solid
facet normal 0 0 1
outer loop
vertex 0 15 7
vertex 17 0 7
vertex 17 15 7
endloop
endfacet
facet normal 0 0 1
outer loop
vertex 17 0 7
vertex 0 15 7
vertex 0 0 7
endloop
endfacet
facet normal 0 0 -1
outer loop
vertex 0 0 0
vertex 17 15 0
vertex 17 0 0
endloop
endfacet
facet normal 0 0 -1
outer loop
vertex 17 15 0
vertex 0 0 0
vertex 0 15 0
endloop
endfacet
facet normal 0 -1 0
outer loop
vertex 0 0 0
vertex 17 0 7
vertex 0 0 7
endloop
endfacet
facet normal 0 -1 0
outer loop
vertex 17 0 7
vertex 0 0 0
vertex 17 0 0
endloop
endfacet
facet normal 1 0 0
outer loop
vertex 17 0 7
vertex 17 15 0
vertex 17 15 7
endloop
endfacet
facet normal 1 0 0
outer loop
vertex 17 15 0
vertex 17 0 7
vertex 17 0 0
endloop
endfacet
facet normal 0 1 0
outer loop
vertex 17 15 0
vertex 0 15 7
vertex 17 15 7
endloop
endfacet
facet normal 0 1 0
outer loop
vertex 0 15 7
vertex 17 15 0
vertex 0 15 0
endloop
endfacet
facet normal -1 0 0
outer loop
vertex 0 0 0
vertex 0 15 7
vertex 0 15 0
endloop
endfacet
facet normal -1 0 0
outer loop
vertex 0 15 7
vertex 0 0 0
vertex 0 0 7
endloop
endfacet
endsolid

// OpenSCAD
// Generated by SolidPython 1.0.1 on 2020-07-29 00:46:56


cube(size = [17, 15, 7]);
/***********************************************
*********      SolidPython code:      **********
************************************************
 
# import packages: SolidPython
from solid import *
from solid.utils import *
from itertools import chain, combinations, permutations


class Resize:

    def __init__(self, scad_file):
        self.scad_file = scad_file
        #self.scad_file = import_scad(scad_file)
        # cone/cylinder param:
        self.r1 = 0
        self.r2 = 0
        self.h = 0
        # rectangular prism param:
        self.w = 0
        self.l = 0
        # ellipse param:
        self.r = 0

    # import OpenScad code (file name corresponds to shape)


    # classify shape + parameters
    def assign(self, param1, param2, param3):
        if self.scad_file == 'cone.scad':
            self.r1 = param1
            self.r2 = param2
            self.h = param3
        elif self.scad_file == 'cylinder.scad':
            self.r1 = param1
            self.r2 = param2
            self.h = param3
        elif self.scad_file == 'rectangularPrism.scad':
            self.h = param1
            self.l = param2
            self.w = param3
        else:
            self.r = param1
            self.h = param2

    # resize parameters
    def iterate(self):
        x = range(3, 20, 2)
        i = 1
        if self.scad_file == 'cone.scad':
            tempList = list(permutations(x, 2))
            for temp in tempList:
                param1 = temp[0]
                param2 = temp[1]
                filepath = 'produced_scad_files/' + 'cone' + str(param1) + '_' + str(param2) + '_' + '.scad'
                scad_render_to_file(cylinder(h=param1, r1=param2, r2=0), filepath)

        elif self.scad_file == 'cylinder.scad':
            tempList = list(permutations(x, 3))
            for temp in tempList:
                param1 = temp[0]
                param2 = temp[1]
                filepath = 'produced_scad_files/' + 'cylinder' + str(param1) + '_' + str(param2) + '_' + '.scad'
                scad_render_to_file(cylinder(h=param1, r1=param2, r2=param2), filepath)

        elif self.scad_file == 'rectangularPrism.scad':
            tempList = list(permutations(x, 3))
            for temp in tempList:
                param1 = temp[0]
                param2 = temp[1]
                param3 = temp[2]
                filepath = 'produced_scad_files/' + 'rectangularPrism' + str(param1) + '_' + str(param2) + '_' + str(
                    param3) + '.scad'
                scad_render_to_file(cube(size=(param1, param2, param3)), filepath)

        elif self.scad_file == 'ellipse.scad':
            tempList = list(permutations(x, 4))
            for temp in tempList:
                param1 = temp[0]
                param2 = temp[1]
                param3 = temp[2]
                param4 = temp[3]
                filepath = 'produced_scad_files/' + 'ellipse' + str(param1) + '_' + str(param2) + '_' + str(param3) + '_' + str(param4) + '.scad'
                scad_render_to_file(scale([param1, param2, param3])(sphere(r=param4)), filepath)

    def render_to_scadfile(self):
        scad_render_to_file(scad, 'example.scad') 
 
************************************************/
